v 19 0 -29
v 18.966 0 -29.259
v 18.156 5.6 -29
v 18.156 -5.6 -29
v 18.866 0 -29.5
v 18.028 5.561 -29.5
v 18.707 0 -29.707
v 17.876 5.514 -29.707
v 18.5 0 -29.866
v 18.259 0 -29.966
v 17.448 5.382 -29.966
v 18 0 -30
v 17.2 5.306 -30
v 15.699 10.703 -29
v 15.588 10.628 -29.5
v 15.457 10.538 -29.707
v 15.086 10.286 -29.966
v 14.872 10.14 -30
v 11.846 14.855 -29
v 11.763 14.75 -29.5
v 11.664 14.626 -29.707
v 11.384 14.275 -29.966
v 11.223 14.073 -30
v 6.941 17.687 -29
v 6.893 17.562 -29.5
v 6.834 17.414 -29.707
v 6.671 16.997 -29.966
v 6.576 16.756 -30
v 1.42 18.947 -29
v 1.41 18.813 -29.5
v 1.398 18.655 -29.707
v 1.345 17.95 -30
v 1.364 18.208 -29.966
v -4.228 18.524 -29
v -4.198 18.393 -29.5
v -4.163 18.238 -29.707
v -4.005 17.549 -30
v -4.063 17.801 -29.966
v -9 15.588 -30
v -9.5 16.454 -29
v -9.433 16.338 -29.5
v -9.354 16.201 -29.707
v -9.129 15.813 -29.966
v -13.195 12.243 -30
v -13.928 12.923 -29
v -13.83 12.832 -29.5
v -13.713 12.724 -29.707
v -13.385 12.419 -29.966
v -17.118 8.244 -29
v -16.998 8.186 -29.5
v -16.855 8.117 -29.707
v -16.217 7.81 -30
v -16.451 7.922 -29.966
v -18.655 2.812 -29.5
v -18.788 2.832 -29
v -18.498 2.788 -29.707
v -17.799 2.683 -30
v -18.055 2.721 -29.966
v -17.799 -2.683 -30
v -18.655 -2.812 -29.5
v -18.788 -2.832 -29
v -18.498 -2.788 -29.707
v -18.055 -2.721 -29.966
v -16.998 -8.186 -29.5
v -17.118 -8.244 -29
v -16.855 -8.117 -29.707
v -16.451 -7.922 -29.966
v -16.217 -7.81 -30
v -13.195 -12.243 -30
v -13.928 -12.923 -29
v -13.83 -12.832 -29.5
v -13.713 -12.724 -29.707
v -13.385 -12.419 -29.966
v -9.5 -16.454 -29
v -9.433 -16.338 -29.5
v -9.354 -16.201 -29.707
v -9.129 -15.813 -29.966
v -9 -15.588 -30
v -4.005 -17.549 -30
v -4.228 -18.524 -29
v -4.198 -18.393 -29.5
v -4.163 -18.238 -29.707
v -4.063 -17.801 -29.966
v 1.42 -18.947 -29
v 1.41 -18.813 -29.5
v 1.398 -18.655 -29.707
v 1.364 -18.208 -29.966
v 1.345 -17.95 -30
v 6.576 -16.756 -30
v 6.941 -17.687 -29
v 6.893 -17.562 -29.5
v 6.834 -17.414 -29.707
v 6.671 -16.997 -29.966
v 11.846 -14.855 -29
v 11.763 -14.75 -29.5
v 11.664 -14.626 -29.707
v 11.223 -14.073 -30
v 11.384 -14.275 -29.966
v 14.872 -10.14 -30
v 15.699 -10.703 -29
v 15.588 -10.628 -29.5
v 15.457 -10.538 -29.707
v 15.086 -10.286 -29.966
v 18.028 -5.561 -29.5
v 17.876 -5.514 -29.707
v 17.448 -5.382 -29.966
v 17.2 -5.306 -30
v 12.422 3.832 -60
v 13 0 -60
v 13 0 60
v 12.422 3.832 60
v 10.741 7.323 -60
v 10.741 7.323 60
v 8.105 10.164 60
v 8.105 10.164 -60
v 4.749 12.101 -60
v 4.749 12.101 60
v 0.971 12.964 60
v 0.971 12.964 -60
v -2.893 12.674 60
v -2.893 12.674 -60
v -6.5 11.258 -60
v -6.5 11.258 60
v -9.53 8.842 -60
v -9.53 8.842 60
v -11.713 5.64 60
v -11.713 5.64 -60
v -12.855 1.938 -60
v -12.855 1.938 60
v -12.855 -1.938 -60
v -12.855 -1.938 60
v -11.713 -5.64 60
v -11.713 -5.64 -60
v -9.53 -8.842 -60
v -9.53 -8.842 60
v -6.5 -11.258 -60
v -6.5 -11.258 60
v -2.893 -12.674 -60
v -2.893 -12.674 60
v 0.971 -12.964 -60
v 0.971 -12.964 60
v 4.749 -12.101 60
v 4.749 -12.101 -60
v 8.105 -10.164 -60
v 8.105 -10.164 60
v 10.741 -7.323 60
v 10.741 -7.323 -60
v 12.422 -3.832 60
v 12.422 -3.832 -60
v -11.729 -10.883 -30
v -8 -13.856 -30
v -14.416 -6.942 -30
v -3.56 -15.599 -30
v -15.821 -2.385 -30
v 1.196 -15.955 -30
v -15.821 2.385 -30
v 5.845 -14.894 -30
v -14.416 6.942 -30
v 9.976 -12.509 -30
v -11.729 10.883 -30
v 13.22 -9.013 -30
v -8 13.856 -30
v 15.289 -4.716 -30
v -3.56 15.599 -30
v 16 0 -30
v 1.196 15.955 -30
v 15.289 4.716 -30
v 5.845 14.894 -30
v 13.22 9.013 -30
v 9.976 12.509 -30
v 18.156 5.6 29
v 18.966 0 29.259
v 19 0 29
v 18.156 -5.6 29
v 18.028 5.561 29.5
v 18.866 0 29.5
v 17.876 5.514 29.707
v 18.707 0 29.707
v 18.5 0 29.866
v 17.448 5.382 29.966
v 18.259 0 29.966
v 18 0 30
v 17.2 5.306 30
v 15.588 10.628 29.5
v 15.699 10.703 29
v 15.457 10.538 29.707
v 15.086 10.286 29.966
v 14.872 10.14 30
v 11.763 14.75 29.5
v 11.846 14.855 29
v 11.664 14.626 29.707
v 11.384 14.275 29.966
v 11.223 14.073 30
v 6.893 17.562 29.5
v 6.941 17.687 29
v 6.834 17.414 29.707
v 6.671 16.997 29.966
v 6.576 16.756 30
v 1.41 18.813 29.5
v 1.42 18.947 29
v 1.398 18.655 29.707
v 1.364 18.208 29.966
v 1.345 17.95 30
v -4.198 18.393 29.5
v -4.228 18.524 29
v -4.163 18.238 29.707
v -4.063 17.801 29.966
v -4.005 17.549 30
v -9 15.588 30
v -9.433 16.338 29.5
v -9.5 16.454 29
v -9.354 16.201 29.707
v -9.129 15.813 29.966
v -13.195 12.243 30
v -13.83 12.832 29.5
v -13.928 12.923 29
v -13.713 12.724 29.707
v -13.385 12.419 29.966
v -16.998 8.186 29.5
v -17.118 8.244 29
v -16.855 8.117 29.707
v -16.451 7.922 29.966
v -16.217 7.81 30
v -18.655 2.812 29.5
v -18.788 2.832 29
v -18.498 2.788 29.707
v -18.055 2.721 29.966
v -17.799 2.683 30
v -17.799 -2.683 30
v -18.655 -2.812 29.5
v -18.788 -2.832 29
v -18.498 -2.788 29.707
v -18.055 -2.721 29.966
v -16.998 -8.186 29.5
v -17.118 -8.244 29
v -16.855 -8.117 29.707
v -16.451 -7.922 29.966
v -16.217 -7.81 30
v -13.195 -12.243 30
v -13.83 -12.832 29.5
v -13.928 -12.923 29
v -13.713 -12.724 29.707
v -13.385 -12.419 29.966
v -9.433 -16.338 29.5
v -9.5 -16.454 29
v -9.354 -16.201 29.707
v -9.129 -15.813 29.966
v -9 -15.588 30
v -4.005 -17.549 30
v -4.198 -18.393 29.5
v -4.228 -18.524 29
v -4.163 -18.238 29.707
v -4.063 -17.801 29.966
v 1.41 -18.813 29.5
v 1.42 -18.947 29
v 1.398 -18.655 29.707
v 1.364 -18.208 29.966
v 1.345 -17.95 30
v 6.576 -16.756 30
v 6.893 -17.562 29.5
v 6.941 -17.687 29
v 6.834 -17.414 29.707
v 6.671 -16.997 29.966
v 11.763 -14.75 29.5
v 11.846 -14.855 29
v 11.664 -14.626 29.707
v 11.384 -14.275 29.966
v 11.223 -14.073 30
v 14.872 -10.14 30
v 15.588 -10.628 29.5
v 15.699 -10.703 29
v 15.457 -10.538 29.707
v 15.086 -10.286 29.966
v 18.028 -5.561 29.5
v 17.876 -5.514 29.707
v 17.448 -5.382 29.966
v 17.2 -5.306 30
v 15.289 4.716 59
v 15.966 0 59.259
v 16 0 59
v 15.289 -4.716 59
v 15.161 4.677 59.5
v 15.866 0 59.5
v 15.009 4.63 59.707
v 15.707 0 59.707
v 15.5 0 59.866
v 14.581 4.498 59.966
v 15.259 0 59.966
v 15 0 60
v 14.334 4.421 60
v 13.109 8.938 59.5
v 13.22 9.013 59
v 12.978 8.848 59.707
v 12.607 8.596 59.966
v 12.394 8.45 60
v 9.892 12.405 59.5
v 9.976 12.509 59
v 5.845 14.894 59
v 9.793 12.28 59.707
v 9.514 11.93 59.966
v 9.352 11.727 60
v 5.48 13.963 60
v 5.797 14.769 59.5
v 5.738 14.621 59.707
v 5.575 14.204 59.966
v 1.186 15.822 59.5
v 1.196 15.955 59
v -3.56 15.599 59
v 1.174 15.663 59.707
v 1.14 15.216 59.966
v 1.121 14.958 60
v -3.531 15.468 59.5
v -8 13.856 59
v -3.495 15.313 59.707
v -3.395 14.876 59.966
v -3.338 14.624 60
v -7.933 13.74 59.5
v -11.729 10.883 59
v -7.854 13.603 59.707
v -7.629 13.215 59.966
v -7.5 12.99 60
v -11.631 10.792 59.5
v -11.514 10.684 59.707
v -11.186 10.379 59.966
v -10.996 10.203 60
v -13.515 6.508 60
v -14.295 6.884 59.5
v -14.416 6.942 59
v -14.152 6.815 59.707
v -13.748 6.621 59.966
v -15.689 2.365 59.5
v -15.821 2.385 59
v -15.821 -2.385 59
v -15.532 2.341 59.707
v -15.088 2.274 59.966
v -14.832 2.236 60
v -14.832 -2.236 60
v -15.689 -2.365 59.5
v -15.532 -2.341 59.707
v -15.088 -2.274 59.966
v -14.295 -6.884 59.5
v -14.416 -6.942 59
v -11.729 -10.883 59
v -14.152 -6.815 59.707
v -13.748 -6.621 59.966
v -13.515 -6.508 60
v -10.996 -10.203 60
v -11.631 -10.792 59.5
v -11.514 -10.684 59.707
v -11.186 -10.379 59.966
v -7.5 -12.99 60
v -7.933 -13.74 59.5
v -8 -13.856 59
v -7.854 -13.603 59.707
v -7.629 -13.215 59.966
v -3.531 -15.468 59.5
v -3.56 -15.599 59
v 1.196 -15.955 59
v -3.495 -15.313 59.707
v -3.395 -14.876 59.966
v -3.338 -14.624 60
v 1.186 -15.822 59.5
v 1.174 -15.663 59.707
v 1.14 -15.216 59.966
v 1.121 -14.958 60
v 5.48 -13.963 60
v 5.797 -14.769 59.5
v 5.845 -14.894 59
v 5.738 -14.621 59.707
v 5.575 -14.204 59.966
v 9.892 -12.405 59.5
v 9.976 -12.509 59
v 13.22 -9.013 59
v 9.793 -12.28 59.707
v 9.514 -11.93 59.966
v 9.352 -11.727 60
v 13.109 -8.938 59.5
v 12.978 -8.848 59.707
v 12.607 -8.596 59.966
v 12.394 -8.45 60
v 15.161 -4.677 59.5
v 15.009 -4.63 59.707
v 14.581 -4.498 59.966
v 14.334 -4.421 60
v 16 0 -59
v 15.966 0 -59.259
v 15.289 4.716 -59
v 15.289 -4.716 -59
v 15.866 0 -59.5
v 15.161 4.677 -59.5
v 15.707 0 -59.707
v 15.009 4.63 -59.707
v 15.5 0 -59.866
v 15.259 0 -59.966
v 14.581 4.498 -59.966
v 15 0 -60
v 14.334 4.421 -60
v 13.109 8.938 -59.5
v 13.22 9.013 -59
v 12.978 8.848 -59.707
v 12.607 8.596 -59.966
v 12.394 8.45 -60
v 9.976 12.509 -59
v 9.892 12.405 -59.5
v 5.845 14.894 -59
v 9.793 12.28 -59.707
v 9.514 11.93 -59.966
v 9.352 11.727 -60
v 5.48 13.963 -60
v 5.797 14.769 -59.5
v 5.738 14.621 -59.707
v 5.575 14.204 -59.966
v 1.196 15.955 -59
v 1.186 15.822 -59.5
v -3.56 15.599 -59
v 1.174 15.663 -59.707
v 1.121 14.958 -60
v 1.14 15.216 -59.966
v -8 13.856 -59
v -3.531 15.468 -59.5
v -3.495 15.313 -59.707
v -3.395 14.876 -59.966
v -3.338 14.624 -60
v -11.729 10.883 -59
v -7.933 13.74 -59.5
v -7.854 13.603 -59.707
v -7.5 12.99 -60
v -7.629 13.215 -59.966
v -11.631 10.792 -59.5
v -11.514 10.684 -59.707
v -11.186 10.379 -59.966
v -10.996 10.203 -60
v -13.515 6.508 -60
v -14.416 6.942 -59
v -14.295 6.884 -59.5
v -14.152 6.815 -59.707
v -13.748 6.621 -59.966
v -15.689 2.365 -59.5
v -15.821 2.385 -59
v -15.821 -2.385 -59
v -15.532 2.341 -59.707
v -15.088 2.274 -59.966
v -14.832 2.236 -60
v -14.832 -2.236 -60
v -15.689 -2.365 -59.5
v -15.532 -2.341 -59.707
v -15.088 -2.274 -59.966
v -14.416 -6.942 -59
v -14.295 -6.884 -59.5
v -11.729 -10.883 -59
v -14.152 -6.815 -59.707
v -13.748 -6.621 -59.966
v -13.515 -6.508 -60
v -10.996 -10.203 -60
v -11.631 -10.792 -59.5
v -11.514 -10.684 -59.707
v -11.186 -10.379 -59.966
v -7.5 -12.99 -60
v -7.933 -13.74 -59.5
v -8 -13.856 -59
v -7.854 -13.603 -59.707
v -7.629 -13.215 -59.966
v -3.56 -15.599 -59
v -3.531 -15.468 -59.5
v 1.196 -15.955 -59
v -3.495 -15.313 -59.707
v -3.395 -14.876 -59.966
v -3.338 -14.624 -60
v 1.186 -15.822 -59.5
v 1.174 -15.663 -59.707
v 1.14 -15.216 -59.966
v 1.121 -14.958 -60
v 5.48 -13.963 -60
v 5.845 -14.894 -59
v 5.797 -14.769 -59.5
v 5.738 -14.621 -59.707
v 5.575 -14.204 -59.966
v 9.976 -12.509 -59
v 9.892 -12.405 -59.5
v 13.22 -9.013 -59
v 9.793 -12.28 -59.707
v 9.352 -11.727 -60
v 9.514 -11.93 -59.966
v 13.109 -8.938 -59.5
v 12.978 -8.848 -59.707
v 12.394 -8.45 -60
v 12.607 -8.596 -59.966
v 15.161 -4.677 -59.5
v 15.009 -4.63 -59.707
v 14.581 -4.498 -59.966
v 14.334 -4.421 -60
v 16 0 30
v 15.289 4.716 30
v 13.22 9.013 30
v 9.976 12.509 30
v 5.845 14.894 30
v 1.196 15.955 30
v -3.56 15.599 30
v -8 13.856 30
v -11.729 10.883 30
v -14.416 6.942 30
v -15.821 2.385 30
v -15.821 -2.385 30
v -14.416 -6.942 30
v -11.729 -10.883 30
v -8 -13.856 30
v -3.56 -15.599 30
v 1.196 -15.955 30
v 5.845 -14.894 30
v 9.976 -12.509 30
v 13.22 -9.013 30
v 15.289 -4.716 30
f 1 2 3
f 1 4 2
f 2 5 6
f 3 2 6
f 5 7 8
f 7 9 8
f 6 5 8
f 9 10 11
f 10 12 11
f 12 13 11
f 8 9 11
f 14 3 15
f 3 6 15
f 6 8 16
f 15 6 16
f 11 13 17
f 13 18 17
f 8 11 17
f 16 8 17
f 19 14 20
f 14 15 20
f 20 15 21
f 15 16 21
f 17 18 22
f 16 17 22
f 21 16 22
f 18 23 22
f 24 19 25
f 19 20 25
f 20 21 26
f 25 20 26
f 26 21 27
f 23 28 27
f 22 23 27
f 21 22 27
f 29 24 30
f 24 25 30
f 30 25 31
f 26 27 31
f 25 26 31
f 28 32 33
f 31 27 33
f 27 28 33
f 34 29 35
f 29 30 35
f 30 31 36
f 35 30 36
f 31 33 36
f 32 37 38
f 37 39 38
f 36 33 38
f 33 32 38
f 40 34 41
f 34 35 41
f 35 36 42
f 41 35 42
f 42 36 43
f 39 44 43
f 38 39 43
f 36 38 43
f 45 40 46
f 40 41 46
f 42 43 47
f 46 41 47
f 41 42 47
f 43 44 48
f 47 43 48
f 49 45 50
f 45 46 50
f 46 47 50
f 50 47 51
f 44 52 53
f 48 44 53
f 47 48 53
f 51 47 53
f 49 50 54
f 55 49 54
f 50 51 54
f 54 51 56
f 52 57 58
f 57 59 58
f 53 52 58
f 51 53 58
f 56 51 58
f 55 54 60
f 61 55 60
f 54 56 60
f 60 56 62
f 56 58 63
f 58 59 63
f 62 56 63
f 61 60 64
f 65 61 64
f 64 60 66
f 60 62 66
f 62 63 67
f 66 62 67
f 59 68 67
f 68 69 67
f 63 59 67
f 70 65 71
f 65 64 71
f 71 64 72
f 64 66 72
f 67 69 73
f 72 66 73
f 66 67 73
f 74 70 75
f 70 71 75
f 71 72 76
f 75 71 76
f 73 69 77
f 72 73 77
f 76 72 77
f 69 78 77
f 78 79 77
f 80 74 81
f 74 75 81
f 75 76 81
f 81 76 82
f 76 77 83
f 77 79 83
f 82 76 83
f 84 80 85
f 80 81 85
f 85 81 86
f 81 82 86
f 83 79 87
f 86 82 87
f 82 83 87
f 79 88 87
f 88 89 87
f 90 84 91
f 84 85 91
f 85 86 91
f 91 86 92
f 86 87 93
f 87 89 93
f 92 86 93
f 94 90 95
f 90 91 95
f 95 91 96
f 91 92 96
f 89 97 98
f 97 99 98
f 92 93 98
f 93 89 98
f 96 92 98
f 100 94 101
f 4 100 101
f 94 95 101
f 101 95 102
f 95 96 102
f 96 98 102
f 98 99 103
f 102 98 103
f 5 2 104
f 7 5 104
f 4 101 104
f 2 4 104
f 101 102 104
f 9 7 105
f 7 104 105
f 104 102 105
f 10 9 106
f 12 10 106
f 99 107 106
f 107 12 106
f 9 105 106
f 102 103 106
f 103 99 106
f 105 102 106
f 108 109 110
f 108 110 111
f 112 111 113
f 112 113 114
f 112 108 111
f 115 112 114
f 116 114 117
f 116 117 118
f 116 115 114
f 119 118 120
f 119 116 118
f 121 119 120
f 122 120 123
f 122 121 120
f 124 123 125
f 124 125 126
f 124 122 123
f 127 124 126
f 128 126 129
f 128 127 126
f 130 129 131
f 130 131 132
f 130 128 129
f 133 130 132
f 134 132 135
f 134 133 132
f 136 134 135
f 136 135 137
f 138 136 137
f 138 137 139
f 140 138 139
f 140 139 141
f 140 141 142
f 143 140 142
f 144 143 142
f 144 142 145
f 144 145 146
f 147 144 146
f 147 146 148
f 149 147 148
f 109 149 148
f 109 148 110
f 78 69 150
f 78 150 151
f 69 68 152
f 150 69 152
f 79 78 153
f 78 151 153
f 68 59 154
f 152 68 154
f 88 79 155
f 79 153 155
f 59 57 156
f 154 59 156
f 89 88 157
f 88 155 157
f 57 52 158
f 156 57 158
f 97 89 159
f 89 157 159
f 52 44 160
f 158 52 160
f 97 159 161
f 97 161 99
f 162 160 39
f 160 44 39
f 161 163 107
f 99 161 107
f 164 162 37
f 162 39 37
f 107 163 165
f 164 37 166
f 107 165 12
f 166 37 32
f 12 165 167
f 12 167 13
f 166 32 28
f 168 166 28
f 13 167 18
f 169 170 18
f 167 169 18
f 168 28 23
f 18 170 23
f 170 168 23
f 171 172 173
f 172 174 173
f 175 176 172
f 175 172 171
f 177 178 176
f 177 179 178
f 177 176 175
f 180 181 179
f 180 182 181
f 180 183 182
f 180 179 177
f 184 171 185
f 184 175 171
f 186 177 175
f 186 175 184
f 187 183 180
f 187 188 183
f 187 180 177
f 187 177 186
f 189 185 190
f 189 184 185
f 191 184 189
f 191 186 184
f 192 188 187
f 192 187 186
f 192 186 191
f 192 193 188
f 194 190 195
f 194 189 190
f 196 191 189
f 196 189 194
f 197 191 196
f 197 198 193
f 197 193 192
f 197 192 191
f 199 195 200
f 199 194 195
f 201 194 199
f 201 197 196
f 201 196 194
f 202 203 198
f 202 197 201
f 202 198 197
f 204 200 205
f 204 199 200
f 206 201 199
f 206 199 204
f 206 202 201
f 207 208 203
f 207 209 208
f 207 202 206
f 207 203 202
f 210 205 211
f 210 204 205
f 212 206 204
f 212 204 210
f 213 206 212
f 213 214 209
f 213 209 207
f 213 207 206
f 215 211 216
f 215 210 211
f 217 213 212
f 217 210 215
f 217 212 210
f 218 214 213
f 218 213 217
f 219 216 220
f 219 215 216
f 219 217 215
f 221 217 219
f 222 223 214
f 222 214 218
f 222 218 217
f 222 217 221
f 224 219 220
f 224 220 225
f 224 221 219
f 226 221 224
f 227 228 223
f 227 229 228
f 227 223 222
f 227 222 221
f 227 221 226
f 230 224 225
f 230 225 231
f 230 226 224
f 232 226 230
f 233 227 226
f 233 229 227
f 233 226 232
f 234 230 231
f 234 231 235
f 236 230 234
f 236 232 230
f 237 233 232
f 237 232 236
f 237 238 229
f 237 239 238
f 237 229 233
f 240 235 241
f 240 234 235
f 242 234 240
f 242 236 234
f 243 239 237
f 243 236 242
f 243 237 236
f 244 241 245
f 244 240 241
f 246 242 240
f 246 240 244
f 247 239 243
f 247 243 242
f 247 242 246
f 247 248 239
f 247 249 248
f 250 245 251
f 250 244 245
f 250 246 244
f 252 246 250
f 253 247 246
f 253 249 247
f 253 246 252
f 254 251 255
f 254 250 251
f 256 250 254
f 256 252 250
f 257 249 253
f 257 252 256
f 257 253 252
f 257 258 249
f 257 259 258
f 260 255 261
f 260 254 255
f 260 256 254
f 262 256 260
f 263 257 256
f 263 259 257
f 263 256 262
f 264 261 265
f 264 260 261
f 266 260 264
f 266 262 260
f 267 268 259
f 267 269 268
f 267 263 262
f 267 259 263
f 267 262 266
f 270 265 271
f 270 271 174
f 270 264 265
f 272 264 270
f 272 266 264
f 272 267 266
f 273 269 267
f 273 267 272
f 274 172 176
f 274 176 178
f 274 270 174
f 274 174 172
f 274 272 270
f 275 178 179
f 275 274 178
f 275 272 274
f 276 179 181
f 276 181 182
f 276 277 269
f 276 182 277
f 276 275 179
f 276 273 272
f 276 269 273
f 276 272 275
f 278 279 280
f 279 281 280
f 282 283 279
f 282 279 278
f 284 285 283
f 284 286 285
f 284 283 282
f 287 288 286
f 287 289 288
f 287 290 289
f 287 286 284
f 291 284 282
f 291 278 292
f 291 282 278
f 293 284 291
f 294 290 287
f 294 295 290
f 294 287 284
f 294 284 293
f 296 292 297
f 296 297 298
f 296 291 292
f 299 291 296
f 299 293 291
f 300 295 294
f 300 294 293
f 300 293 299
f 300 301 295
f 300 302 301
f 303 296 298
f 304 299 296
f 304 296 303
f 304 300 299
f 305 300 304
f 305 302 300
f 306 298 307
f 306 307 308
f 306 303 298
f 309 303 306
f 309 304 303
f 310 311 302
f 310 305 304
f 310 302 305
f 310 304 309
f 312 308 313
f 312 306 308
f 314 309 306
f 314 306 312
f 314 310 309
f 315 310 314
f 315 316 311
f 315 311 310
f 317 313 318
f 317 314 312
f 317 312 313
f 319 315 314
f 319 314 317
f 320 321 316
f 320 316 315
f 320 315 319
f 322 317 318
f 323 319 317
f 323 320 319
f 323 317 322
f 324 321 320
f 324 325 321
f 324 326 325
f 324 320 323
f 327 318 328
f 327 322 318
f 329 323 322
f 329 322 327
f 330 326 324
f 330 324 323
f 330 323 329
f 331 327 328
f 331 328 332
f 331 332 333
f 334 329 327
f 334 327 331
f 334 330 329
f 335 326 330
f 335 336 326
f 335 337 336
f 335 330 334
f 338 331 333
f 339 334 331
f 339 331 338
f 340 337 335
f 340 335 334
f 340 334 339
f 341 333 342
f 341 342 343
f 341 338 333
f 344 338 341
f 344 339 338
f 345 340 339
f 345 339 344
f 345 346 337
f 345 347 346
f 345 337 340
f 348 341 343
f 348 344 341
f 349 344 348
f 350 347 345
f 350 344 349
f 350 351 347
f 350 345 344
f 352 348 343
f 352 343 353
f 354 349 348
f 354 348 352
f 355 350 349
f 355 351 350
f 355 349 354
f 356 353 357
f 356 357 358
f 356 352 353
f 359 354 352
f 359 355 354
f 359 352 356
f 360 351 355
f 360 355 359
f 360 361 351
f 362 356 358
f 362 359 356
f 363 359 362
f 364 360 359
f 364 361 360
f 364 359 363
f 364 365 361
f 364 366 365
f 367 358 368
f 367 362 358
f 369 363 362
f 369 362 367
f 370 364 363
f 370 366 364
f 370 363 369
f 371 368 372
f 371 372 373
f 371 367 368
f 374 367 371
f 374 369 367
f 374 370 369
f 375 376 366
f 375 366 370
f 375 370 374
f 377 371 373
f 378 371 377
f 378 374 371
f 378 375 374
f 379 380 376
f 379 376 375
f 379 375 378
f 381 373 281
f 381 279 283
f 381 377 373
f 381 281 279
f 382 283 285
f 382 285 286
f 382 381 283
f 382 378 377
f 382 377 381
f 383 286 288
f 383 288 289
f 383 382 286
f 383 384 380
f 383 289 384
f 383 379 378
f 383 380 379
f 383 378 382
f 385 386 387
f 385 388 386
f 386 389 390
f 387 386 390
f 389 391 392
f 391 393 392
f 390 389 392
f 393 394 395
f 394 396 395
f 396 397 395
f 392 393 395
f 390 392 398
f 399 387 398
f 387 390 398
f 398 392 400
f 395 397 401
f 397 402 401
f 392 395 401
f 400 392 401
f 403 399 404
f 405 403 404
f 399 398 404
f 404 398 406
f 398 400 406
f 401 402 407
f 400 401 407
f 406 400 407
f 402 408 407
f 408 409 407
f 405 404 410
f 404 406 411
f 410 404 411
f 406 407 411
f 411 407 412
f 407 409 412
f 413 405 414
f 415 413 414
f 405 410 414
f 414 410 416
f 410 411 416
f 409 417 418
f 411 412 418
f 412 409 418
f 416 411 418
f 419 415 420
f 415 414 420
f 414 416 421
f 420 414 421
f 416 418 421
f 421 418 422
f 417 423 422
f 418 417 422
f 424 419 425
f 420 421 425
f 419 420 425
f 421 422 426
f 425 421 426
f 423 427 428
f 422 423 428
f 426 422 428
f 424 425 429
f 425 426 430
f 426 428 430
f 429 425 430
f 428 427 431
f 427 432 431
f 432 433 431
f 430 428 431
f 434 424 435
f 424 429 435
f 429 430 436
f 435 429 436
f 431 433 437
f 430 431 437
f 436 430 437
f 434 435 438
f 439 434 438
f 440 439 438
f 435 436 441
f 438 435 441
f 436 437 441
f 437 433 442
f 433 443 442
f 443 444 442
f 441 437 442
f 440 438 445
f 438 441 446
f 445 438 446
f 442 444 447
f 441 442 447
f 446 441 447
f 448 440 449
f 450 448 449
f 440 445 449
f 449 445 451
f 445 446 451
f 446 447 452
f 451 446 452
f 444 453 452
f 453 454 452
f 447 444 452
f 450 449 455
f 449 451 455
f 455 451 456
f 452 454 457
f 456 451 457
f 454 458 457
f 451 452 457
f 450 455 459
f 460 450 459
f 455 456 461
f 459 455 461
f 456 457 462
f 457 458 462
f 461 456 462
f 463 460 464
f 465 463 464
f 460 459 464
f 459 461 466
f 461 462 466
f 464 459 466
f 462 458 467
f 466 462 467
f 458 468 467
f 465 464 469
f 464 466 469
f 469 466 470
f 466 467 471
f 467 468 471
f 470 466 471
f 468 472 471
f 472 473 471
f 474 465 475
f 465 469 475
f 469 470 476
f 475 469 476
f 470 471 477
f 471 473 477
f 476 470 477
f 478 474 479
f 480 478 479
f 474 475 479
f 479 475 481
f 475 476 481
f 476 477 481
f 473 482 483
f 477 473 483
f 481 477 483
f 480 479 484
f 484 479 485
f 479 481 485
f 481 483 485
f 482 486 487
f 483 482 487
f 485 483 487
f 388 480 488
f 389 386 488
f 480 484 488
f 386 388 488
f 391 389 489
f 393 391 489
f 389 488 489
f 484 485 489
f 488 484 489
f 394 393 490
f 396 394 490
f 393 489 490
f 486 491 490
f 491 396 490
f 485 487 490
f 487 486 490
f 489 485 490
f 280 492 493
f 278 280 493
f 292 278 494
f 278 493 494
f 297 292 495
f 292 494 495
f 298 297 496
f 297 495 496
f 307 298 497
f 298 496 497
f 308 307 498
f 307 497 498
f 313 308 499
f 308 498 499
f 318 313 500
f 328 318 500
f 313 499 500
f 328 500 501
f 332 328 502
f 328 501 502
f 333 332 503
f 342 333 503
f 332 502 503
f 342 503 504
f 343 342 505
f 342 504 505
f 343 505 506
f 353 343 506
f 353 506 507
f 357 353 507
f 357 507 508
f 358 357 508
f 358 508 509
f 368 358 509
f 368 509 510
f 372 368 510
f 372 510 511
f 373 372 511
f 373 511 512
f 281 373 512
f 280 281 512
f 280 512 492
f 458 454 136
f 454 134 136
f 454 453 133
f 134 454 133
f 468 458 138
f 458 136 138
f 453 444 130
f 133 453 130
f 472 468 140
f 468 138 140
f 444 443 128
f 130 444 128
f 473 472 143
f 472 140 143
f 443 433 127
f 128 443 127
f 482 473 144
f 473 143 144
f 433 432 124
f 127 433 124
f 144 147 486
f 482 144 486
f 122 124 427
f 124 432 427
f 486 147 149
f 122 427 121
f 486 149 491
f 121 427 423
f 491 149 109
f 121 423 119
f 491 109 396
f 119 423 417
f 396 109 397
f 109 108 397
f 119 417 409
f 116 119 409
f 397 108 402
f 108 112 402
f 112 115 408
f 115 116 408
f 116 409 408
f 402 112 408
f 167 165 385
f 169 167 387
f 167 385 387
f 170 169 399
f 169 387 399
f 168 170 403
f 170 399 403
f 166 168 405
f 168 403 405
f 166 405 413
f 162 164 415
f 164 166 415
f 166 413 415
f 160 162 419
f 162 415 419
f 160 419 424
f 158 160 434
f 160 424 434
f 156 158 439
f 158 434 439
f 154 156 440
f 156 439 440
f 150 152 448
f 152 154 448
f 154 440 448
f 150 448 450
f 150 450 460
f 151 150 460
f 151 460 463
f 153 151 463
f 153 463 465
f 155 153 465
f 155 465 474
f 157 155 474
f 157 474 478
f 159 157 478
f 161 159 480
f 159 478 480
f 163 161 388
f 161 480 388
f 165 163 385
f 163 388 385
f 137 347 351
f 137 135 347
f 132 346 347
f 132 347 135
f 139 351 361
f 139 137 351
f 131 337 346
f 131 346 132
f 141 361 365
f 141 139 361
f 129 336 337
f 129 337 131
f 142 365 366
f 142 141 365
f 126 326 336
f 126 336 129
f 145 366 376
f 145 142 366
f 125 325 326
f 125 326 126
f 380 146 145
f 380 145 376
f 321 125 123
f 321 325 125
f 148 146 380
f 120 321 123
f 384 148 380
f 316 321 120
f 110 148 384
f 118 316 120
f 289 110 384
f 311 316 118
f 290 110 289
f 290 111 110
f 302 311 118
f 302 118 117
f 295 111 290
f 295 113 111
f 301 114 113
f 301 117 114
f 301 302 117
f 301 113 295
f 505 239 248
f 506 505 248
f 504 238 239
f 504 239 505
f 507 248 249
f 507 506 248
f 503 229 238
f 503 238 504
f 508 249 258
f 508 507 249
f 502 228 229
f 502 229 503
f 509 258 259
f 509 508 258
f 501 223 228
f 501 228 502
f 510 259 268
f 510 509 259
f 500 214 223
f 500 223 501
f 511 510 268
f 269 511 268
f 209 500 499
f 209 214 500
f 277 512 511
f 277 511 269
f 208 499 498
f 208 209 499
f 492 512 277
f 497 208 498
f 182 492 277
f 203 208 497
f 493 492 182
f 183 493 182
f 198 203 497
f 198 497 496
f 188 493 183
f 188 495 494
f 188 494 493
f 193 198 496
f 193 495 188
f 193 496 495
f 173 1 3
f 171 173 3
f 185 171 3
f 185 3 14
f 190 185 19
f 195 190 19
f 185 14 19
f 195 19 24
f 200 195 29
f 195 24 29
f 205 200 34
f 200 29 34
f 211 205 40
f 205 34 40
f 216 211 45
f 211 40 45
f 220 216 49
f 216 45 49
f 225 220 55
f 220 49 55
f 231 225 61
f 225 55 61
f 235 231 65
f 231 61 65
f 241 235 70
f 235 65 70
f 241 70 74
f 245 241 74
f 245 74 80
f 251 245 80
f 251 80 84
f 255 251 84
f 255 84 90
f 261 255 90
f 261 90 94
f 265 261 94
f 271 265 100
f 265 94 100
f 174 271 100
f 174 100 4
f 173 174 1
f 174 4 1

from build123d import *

# Parameters (mm, degrees)
CYLINDER002_R     = 13
CYLINDER002_DEPTH = 120
CYLINDER001_R     = 16
CYLINDER001_DEPTH = 120
FILLET001_R       = 1
CYLINDER003_R     = 13
CYLINDER003_DEPTH = 120
CYLINDER_R        = 19
CYLINDER_DEPTH    = 60
FILLET_R          = 1


with BuildPart() as indre_hul:
    # Cylinder002 → Cylinder002 (new body)
    with BuildSketch(Plane.XY.offset(-60)):
        Circle(CYLINDER002_R)
    extrude(amount=CYLINDER002_DEPTH)


with BuildPart() as fillet001:
    # Cylinder001 → Cylinder001 (new body)
    with BuildSketch(Plane.XY.offset(-60)):
        Circle(CYLINDER001_R)
    extrude(amount=CYLINDER001_DEPTH)

    # Cut: cut Indre hul
    add(indre_hul.part, mode=Mode.SUBTRACT)

    # Fillet001
    fillet001_edges = [fillet001.edges().sort_by_distance(p)[0] for p in [
        (-16, 0, 60),
        (-16, 0, -60),
    ]]
    fillet(fillet001_edges, radius=FILLET001_R)


with BuildPart() as indre_hul001:
    # Cylinder003 → Cylinder003 (new body)
    with BuildSketch(Plane.XY.offset(-60)):
        Circle(CYLINDER003_R)
    extrude(amount=CYLINDER003_DEPTH)


with BuildPart() as fusion:
    # Cylinder → Cylinder (new body)
    with BuildSketch(Plane.XY.offset(-30)):
        Circle(CYLINDER_R)
    extrude(amount=CYLINDER_DEPTH)

    # Cut001: cut Indre hul001
    add(indre_hul001.part, mode=Mode.SUBTRACT)

    # Fillet
    fillet_edges = [fusion.edges().sort_by_distance(p)[0] for p in [
        (-19, 0, 30),
        (-19, 0, -30),
    ]]
    fillet(fillet_edges, radius=FILLET_R)

    # Fusion: union Fillet001
    add(fillet001.part)


solid = fusion.part
